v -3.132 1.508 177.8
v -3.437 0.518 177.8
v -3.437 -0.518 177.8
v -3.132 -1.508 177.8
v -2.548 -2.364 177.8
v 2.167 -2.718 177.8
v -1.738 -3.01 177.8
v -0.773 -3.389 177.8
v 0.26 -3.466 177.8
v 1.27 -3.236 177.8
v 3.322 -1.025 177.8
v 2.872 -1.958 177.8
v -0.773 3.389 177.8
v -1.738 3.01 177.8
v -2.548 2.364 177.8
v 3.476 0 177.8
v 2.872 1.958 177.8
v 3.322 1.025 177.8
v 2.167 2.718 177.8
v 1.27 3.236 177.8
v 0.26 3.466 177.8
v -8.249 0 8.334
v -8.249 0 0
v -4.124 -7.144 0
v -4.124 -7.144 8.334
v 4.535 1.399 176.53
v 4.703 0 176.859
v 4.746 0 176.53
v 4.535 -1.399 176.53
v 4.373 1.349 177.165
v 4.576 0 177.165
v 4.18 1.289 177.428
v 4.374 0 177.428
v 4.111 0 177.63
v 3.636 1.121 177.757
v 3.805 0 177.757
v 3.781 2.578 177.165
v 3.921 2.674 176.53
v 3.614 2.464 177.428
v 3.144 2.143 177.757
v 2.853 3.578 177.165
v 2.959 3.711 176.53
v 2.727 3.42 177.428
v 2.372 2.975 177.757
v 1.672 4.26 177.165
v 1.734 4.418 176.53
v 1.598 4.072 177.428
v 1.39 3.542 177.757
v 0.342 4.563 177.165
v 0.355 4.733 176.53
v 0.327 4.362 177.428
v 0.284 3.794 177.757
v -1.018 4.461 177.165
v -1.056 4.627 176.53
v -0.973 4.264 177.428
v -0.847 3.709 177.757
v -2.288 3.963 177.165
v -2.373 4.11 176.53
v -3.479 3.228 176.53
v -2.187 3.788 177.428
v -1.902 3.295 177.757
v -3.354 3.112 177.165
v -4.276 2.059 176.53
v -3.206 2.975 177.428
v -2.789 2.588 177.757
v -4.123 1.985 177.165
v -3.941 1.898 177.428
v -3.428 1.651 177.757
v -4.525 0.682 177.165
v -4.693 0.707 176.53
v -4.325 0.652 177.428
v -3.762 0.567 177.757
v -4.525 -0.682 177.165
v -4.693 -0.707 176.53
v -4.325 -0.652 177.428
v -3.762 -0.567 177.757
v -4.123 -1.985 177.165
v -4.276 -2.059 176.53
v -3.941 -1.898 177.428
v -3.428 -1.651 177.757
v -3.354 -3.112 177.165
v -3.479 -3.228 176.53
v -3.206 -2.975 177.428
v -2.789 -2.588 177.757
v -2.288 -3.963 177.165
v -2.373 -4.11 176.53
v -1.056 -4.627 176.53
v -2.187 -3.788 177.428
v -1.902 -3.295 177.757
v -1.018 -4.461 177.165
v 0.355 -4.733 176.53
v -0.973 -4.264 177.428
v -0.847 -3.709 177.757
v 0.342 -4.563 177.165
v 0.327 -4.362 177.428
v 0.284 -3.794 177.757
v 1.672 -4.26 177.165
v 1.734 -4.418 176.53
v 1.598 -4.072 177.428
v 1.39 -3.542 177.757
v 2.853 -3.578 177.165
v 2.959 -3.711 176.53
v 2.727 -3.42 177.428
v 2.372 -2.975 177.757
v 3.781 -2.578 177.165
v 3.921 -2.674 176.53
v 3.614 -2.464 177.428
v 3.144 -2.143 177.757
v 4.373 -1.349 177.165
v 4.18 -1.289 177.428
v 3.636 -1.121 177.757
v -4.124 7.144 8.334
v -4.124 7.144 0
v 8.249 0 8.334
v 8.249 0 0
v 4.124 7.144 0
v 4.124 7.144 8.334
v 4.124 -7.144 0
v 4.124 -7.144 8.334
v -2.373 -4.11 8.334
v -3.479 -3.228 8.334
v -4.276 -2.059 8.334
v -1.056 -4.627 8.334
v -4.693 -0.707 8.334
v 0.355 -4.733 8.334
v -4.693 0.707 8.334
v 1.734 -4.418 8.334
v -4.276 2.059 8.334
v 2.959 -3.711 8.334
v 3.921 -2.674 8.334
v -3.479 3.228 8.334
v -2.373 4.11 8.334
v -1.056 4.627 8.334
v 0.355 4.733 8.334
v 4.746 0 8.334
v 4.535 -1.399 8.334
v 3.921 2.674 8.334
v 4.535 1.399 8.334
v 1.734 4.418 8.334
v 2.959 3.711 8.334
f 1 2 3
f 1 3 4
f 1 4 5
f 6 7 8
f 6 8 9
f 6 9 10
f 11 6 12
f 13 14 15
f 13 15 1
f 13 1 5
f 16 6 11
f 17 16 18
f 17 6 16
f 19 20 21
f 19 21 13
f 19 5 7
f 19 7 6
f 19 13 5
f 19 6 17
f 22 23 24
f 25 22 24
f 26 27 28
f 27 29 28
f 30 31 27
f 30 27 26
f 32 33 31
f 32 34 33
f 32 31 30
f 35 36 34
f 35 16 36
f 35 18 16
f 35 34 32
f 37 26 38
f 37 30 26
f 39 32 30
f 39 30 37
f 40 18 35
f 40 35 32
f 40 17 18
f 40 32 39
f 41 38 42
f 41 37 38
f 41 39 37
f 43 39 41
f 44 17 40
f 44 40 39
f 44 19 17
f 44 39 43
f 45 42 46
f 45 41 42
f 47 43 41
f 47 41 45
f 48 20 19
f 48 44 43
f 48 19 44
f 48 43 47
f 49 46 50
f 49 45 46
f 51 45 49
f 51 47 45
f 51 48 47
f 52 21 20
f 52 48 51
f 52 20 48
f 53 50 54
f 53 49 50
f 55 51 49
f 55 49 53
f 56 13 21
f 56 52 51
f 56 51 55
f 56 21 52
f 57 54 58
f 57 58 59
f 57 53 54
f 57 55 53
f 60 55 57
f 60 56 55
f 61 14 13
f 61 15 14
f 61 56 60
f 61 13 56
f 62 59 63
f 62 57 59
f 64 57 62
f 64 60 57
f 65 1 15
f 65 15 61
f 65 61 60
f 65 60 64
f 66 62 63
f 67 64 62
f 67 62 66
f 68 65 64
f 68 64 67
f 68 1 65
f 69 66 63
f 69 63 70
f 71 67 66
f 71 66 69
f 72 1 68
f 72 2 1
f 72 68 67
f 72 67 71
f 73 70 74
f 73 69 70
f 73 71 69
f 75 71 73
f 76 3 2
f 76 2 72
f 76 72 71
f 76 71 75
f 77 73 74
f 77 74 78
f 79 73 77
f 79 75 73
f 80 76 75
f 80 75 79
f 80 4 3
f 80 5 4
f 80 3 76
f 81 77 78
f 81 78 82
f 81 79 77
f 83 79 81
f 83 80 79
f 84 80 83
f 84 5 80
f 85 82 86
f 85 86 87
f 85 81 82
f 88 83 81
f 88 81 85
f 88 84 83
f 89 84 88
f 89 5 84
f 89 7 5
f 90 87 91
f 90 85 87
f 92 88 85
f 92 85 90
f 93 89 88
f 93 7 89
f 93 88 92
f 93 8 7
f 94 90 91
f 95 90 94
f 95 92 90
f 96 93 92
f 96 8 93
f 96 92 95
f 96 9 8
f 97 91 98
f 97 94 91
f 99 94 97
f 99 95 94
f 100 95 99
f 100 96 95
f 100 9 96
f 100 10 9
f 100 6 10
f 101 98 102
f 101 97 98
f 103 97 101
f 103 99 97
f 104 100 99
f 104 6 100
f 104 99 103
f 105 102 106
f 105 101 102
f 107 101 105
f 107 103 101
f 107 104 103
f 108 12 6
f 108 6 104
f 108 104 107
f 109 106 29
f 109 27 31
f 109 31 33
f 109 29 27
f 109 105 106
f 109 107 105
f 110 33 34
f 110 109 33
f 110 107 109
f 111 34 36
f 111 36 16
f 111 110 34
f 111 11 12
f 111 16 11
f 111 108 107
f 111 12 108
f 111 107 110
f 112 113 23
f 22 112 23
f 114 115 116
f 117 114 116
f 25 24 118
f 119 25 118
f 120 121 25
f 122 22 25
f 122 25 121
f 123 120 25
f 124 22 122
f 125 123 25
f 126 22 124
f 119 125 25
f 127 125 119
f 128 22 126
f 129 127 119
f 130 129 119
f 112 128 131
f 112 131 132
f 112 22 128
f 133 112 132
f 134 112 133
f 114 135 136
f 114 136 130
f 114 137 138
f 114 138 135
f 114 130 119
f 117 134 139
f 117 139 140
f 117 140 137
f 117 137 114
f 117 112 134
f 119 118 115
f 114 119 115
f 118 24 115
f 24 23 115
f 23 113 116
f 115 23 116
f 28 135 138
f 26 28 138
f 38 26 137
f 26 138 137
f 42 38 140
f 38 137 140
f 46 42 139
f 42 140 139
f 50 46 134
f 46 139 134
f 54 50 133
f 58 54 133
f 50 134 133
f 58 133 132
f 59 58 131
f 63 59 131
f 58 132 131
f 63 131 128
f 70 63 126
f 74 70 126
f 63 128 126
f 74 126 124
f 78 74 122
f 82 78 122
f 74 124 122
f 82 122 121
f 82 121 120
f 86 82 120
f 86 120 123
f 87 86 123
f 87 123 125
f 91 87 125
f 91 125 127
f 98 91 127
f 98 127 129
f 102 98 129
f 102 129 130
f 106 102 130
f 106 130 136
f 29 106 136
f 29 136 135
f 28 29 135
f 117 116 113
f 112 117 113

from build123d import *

# Parameters (mm, degrees)
F0_R     = 4.74599
F1_DEPTH = 177.8
F3_DEPTH = 8.334375
F4_R     = 1.27


# Not quite as in the source:
# - a length typed as a fraction of an inch, garbled in the dataset ("3 / 203.2 mm" for 3/8 in), is restored


with BuildPart() as f1:
    # F0 (on Top) → F1 (new body)
    with BuildSketch(Plane.XY):
        Circle(F0_R)
    extrude(amount=F1_DEPTH)

    # F2 (on Top) → F3 (join)
    with BuildSketch(Plane.XY):
        Polygon((-4.1244459855, -7.14375), (4.1244459855, -7.14375), (8.248891971, 0), (4.1244459855, 7.14375), (-4.1244459855, 7.14375), (-8.248891971, 0), align=None)
    extrude(amount=F3_DEPTH)

    # F4
    f4_edges = [f1.edges().sort_by_distance(p)[0] for p in [
        (-4.74599, 0, 177.8),
    ]]
    fillet(f4_edges, radius=F4_R)


solid = f1.part
